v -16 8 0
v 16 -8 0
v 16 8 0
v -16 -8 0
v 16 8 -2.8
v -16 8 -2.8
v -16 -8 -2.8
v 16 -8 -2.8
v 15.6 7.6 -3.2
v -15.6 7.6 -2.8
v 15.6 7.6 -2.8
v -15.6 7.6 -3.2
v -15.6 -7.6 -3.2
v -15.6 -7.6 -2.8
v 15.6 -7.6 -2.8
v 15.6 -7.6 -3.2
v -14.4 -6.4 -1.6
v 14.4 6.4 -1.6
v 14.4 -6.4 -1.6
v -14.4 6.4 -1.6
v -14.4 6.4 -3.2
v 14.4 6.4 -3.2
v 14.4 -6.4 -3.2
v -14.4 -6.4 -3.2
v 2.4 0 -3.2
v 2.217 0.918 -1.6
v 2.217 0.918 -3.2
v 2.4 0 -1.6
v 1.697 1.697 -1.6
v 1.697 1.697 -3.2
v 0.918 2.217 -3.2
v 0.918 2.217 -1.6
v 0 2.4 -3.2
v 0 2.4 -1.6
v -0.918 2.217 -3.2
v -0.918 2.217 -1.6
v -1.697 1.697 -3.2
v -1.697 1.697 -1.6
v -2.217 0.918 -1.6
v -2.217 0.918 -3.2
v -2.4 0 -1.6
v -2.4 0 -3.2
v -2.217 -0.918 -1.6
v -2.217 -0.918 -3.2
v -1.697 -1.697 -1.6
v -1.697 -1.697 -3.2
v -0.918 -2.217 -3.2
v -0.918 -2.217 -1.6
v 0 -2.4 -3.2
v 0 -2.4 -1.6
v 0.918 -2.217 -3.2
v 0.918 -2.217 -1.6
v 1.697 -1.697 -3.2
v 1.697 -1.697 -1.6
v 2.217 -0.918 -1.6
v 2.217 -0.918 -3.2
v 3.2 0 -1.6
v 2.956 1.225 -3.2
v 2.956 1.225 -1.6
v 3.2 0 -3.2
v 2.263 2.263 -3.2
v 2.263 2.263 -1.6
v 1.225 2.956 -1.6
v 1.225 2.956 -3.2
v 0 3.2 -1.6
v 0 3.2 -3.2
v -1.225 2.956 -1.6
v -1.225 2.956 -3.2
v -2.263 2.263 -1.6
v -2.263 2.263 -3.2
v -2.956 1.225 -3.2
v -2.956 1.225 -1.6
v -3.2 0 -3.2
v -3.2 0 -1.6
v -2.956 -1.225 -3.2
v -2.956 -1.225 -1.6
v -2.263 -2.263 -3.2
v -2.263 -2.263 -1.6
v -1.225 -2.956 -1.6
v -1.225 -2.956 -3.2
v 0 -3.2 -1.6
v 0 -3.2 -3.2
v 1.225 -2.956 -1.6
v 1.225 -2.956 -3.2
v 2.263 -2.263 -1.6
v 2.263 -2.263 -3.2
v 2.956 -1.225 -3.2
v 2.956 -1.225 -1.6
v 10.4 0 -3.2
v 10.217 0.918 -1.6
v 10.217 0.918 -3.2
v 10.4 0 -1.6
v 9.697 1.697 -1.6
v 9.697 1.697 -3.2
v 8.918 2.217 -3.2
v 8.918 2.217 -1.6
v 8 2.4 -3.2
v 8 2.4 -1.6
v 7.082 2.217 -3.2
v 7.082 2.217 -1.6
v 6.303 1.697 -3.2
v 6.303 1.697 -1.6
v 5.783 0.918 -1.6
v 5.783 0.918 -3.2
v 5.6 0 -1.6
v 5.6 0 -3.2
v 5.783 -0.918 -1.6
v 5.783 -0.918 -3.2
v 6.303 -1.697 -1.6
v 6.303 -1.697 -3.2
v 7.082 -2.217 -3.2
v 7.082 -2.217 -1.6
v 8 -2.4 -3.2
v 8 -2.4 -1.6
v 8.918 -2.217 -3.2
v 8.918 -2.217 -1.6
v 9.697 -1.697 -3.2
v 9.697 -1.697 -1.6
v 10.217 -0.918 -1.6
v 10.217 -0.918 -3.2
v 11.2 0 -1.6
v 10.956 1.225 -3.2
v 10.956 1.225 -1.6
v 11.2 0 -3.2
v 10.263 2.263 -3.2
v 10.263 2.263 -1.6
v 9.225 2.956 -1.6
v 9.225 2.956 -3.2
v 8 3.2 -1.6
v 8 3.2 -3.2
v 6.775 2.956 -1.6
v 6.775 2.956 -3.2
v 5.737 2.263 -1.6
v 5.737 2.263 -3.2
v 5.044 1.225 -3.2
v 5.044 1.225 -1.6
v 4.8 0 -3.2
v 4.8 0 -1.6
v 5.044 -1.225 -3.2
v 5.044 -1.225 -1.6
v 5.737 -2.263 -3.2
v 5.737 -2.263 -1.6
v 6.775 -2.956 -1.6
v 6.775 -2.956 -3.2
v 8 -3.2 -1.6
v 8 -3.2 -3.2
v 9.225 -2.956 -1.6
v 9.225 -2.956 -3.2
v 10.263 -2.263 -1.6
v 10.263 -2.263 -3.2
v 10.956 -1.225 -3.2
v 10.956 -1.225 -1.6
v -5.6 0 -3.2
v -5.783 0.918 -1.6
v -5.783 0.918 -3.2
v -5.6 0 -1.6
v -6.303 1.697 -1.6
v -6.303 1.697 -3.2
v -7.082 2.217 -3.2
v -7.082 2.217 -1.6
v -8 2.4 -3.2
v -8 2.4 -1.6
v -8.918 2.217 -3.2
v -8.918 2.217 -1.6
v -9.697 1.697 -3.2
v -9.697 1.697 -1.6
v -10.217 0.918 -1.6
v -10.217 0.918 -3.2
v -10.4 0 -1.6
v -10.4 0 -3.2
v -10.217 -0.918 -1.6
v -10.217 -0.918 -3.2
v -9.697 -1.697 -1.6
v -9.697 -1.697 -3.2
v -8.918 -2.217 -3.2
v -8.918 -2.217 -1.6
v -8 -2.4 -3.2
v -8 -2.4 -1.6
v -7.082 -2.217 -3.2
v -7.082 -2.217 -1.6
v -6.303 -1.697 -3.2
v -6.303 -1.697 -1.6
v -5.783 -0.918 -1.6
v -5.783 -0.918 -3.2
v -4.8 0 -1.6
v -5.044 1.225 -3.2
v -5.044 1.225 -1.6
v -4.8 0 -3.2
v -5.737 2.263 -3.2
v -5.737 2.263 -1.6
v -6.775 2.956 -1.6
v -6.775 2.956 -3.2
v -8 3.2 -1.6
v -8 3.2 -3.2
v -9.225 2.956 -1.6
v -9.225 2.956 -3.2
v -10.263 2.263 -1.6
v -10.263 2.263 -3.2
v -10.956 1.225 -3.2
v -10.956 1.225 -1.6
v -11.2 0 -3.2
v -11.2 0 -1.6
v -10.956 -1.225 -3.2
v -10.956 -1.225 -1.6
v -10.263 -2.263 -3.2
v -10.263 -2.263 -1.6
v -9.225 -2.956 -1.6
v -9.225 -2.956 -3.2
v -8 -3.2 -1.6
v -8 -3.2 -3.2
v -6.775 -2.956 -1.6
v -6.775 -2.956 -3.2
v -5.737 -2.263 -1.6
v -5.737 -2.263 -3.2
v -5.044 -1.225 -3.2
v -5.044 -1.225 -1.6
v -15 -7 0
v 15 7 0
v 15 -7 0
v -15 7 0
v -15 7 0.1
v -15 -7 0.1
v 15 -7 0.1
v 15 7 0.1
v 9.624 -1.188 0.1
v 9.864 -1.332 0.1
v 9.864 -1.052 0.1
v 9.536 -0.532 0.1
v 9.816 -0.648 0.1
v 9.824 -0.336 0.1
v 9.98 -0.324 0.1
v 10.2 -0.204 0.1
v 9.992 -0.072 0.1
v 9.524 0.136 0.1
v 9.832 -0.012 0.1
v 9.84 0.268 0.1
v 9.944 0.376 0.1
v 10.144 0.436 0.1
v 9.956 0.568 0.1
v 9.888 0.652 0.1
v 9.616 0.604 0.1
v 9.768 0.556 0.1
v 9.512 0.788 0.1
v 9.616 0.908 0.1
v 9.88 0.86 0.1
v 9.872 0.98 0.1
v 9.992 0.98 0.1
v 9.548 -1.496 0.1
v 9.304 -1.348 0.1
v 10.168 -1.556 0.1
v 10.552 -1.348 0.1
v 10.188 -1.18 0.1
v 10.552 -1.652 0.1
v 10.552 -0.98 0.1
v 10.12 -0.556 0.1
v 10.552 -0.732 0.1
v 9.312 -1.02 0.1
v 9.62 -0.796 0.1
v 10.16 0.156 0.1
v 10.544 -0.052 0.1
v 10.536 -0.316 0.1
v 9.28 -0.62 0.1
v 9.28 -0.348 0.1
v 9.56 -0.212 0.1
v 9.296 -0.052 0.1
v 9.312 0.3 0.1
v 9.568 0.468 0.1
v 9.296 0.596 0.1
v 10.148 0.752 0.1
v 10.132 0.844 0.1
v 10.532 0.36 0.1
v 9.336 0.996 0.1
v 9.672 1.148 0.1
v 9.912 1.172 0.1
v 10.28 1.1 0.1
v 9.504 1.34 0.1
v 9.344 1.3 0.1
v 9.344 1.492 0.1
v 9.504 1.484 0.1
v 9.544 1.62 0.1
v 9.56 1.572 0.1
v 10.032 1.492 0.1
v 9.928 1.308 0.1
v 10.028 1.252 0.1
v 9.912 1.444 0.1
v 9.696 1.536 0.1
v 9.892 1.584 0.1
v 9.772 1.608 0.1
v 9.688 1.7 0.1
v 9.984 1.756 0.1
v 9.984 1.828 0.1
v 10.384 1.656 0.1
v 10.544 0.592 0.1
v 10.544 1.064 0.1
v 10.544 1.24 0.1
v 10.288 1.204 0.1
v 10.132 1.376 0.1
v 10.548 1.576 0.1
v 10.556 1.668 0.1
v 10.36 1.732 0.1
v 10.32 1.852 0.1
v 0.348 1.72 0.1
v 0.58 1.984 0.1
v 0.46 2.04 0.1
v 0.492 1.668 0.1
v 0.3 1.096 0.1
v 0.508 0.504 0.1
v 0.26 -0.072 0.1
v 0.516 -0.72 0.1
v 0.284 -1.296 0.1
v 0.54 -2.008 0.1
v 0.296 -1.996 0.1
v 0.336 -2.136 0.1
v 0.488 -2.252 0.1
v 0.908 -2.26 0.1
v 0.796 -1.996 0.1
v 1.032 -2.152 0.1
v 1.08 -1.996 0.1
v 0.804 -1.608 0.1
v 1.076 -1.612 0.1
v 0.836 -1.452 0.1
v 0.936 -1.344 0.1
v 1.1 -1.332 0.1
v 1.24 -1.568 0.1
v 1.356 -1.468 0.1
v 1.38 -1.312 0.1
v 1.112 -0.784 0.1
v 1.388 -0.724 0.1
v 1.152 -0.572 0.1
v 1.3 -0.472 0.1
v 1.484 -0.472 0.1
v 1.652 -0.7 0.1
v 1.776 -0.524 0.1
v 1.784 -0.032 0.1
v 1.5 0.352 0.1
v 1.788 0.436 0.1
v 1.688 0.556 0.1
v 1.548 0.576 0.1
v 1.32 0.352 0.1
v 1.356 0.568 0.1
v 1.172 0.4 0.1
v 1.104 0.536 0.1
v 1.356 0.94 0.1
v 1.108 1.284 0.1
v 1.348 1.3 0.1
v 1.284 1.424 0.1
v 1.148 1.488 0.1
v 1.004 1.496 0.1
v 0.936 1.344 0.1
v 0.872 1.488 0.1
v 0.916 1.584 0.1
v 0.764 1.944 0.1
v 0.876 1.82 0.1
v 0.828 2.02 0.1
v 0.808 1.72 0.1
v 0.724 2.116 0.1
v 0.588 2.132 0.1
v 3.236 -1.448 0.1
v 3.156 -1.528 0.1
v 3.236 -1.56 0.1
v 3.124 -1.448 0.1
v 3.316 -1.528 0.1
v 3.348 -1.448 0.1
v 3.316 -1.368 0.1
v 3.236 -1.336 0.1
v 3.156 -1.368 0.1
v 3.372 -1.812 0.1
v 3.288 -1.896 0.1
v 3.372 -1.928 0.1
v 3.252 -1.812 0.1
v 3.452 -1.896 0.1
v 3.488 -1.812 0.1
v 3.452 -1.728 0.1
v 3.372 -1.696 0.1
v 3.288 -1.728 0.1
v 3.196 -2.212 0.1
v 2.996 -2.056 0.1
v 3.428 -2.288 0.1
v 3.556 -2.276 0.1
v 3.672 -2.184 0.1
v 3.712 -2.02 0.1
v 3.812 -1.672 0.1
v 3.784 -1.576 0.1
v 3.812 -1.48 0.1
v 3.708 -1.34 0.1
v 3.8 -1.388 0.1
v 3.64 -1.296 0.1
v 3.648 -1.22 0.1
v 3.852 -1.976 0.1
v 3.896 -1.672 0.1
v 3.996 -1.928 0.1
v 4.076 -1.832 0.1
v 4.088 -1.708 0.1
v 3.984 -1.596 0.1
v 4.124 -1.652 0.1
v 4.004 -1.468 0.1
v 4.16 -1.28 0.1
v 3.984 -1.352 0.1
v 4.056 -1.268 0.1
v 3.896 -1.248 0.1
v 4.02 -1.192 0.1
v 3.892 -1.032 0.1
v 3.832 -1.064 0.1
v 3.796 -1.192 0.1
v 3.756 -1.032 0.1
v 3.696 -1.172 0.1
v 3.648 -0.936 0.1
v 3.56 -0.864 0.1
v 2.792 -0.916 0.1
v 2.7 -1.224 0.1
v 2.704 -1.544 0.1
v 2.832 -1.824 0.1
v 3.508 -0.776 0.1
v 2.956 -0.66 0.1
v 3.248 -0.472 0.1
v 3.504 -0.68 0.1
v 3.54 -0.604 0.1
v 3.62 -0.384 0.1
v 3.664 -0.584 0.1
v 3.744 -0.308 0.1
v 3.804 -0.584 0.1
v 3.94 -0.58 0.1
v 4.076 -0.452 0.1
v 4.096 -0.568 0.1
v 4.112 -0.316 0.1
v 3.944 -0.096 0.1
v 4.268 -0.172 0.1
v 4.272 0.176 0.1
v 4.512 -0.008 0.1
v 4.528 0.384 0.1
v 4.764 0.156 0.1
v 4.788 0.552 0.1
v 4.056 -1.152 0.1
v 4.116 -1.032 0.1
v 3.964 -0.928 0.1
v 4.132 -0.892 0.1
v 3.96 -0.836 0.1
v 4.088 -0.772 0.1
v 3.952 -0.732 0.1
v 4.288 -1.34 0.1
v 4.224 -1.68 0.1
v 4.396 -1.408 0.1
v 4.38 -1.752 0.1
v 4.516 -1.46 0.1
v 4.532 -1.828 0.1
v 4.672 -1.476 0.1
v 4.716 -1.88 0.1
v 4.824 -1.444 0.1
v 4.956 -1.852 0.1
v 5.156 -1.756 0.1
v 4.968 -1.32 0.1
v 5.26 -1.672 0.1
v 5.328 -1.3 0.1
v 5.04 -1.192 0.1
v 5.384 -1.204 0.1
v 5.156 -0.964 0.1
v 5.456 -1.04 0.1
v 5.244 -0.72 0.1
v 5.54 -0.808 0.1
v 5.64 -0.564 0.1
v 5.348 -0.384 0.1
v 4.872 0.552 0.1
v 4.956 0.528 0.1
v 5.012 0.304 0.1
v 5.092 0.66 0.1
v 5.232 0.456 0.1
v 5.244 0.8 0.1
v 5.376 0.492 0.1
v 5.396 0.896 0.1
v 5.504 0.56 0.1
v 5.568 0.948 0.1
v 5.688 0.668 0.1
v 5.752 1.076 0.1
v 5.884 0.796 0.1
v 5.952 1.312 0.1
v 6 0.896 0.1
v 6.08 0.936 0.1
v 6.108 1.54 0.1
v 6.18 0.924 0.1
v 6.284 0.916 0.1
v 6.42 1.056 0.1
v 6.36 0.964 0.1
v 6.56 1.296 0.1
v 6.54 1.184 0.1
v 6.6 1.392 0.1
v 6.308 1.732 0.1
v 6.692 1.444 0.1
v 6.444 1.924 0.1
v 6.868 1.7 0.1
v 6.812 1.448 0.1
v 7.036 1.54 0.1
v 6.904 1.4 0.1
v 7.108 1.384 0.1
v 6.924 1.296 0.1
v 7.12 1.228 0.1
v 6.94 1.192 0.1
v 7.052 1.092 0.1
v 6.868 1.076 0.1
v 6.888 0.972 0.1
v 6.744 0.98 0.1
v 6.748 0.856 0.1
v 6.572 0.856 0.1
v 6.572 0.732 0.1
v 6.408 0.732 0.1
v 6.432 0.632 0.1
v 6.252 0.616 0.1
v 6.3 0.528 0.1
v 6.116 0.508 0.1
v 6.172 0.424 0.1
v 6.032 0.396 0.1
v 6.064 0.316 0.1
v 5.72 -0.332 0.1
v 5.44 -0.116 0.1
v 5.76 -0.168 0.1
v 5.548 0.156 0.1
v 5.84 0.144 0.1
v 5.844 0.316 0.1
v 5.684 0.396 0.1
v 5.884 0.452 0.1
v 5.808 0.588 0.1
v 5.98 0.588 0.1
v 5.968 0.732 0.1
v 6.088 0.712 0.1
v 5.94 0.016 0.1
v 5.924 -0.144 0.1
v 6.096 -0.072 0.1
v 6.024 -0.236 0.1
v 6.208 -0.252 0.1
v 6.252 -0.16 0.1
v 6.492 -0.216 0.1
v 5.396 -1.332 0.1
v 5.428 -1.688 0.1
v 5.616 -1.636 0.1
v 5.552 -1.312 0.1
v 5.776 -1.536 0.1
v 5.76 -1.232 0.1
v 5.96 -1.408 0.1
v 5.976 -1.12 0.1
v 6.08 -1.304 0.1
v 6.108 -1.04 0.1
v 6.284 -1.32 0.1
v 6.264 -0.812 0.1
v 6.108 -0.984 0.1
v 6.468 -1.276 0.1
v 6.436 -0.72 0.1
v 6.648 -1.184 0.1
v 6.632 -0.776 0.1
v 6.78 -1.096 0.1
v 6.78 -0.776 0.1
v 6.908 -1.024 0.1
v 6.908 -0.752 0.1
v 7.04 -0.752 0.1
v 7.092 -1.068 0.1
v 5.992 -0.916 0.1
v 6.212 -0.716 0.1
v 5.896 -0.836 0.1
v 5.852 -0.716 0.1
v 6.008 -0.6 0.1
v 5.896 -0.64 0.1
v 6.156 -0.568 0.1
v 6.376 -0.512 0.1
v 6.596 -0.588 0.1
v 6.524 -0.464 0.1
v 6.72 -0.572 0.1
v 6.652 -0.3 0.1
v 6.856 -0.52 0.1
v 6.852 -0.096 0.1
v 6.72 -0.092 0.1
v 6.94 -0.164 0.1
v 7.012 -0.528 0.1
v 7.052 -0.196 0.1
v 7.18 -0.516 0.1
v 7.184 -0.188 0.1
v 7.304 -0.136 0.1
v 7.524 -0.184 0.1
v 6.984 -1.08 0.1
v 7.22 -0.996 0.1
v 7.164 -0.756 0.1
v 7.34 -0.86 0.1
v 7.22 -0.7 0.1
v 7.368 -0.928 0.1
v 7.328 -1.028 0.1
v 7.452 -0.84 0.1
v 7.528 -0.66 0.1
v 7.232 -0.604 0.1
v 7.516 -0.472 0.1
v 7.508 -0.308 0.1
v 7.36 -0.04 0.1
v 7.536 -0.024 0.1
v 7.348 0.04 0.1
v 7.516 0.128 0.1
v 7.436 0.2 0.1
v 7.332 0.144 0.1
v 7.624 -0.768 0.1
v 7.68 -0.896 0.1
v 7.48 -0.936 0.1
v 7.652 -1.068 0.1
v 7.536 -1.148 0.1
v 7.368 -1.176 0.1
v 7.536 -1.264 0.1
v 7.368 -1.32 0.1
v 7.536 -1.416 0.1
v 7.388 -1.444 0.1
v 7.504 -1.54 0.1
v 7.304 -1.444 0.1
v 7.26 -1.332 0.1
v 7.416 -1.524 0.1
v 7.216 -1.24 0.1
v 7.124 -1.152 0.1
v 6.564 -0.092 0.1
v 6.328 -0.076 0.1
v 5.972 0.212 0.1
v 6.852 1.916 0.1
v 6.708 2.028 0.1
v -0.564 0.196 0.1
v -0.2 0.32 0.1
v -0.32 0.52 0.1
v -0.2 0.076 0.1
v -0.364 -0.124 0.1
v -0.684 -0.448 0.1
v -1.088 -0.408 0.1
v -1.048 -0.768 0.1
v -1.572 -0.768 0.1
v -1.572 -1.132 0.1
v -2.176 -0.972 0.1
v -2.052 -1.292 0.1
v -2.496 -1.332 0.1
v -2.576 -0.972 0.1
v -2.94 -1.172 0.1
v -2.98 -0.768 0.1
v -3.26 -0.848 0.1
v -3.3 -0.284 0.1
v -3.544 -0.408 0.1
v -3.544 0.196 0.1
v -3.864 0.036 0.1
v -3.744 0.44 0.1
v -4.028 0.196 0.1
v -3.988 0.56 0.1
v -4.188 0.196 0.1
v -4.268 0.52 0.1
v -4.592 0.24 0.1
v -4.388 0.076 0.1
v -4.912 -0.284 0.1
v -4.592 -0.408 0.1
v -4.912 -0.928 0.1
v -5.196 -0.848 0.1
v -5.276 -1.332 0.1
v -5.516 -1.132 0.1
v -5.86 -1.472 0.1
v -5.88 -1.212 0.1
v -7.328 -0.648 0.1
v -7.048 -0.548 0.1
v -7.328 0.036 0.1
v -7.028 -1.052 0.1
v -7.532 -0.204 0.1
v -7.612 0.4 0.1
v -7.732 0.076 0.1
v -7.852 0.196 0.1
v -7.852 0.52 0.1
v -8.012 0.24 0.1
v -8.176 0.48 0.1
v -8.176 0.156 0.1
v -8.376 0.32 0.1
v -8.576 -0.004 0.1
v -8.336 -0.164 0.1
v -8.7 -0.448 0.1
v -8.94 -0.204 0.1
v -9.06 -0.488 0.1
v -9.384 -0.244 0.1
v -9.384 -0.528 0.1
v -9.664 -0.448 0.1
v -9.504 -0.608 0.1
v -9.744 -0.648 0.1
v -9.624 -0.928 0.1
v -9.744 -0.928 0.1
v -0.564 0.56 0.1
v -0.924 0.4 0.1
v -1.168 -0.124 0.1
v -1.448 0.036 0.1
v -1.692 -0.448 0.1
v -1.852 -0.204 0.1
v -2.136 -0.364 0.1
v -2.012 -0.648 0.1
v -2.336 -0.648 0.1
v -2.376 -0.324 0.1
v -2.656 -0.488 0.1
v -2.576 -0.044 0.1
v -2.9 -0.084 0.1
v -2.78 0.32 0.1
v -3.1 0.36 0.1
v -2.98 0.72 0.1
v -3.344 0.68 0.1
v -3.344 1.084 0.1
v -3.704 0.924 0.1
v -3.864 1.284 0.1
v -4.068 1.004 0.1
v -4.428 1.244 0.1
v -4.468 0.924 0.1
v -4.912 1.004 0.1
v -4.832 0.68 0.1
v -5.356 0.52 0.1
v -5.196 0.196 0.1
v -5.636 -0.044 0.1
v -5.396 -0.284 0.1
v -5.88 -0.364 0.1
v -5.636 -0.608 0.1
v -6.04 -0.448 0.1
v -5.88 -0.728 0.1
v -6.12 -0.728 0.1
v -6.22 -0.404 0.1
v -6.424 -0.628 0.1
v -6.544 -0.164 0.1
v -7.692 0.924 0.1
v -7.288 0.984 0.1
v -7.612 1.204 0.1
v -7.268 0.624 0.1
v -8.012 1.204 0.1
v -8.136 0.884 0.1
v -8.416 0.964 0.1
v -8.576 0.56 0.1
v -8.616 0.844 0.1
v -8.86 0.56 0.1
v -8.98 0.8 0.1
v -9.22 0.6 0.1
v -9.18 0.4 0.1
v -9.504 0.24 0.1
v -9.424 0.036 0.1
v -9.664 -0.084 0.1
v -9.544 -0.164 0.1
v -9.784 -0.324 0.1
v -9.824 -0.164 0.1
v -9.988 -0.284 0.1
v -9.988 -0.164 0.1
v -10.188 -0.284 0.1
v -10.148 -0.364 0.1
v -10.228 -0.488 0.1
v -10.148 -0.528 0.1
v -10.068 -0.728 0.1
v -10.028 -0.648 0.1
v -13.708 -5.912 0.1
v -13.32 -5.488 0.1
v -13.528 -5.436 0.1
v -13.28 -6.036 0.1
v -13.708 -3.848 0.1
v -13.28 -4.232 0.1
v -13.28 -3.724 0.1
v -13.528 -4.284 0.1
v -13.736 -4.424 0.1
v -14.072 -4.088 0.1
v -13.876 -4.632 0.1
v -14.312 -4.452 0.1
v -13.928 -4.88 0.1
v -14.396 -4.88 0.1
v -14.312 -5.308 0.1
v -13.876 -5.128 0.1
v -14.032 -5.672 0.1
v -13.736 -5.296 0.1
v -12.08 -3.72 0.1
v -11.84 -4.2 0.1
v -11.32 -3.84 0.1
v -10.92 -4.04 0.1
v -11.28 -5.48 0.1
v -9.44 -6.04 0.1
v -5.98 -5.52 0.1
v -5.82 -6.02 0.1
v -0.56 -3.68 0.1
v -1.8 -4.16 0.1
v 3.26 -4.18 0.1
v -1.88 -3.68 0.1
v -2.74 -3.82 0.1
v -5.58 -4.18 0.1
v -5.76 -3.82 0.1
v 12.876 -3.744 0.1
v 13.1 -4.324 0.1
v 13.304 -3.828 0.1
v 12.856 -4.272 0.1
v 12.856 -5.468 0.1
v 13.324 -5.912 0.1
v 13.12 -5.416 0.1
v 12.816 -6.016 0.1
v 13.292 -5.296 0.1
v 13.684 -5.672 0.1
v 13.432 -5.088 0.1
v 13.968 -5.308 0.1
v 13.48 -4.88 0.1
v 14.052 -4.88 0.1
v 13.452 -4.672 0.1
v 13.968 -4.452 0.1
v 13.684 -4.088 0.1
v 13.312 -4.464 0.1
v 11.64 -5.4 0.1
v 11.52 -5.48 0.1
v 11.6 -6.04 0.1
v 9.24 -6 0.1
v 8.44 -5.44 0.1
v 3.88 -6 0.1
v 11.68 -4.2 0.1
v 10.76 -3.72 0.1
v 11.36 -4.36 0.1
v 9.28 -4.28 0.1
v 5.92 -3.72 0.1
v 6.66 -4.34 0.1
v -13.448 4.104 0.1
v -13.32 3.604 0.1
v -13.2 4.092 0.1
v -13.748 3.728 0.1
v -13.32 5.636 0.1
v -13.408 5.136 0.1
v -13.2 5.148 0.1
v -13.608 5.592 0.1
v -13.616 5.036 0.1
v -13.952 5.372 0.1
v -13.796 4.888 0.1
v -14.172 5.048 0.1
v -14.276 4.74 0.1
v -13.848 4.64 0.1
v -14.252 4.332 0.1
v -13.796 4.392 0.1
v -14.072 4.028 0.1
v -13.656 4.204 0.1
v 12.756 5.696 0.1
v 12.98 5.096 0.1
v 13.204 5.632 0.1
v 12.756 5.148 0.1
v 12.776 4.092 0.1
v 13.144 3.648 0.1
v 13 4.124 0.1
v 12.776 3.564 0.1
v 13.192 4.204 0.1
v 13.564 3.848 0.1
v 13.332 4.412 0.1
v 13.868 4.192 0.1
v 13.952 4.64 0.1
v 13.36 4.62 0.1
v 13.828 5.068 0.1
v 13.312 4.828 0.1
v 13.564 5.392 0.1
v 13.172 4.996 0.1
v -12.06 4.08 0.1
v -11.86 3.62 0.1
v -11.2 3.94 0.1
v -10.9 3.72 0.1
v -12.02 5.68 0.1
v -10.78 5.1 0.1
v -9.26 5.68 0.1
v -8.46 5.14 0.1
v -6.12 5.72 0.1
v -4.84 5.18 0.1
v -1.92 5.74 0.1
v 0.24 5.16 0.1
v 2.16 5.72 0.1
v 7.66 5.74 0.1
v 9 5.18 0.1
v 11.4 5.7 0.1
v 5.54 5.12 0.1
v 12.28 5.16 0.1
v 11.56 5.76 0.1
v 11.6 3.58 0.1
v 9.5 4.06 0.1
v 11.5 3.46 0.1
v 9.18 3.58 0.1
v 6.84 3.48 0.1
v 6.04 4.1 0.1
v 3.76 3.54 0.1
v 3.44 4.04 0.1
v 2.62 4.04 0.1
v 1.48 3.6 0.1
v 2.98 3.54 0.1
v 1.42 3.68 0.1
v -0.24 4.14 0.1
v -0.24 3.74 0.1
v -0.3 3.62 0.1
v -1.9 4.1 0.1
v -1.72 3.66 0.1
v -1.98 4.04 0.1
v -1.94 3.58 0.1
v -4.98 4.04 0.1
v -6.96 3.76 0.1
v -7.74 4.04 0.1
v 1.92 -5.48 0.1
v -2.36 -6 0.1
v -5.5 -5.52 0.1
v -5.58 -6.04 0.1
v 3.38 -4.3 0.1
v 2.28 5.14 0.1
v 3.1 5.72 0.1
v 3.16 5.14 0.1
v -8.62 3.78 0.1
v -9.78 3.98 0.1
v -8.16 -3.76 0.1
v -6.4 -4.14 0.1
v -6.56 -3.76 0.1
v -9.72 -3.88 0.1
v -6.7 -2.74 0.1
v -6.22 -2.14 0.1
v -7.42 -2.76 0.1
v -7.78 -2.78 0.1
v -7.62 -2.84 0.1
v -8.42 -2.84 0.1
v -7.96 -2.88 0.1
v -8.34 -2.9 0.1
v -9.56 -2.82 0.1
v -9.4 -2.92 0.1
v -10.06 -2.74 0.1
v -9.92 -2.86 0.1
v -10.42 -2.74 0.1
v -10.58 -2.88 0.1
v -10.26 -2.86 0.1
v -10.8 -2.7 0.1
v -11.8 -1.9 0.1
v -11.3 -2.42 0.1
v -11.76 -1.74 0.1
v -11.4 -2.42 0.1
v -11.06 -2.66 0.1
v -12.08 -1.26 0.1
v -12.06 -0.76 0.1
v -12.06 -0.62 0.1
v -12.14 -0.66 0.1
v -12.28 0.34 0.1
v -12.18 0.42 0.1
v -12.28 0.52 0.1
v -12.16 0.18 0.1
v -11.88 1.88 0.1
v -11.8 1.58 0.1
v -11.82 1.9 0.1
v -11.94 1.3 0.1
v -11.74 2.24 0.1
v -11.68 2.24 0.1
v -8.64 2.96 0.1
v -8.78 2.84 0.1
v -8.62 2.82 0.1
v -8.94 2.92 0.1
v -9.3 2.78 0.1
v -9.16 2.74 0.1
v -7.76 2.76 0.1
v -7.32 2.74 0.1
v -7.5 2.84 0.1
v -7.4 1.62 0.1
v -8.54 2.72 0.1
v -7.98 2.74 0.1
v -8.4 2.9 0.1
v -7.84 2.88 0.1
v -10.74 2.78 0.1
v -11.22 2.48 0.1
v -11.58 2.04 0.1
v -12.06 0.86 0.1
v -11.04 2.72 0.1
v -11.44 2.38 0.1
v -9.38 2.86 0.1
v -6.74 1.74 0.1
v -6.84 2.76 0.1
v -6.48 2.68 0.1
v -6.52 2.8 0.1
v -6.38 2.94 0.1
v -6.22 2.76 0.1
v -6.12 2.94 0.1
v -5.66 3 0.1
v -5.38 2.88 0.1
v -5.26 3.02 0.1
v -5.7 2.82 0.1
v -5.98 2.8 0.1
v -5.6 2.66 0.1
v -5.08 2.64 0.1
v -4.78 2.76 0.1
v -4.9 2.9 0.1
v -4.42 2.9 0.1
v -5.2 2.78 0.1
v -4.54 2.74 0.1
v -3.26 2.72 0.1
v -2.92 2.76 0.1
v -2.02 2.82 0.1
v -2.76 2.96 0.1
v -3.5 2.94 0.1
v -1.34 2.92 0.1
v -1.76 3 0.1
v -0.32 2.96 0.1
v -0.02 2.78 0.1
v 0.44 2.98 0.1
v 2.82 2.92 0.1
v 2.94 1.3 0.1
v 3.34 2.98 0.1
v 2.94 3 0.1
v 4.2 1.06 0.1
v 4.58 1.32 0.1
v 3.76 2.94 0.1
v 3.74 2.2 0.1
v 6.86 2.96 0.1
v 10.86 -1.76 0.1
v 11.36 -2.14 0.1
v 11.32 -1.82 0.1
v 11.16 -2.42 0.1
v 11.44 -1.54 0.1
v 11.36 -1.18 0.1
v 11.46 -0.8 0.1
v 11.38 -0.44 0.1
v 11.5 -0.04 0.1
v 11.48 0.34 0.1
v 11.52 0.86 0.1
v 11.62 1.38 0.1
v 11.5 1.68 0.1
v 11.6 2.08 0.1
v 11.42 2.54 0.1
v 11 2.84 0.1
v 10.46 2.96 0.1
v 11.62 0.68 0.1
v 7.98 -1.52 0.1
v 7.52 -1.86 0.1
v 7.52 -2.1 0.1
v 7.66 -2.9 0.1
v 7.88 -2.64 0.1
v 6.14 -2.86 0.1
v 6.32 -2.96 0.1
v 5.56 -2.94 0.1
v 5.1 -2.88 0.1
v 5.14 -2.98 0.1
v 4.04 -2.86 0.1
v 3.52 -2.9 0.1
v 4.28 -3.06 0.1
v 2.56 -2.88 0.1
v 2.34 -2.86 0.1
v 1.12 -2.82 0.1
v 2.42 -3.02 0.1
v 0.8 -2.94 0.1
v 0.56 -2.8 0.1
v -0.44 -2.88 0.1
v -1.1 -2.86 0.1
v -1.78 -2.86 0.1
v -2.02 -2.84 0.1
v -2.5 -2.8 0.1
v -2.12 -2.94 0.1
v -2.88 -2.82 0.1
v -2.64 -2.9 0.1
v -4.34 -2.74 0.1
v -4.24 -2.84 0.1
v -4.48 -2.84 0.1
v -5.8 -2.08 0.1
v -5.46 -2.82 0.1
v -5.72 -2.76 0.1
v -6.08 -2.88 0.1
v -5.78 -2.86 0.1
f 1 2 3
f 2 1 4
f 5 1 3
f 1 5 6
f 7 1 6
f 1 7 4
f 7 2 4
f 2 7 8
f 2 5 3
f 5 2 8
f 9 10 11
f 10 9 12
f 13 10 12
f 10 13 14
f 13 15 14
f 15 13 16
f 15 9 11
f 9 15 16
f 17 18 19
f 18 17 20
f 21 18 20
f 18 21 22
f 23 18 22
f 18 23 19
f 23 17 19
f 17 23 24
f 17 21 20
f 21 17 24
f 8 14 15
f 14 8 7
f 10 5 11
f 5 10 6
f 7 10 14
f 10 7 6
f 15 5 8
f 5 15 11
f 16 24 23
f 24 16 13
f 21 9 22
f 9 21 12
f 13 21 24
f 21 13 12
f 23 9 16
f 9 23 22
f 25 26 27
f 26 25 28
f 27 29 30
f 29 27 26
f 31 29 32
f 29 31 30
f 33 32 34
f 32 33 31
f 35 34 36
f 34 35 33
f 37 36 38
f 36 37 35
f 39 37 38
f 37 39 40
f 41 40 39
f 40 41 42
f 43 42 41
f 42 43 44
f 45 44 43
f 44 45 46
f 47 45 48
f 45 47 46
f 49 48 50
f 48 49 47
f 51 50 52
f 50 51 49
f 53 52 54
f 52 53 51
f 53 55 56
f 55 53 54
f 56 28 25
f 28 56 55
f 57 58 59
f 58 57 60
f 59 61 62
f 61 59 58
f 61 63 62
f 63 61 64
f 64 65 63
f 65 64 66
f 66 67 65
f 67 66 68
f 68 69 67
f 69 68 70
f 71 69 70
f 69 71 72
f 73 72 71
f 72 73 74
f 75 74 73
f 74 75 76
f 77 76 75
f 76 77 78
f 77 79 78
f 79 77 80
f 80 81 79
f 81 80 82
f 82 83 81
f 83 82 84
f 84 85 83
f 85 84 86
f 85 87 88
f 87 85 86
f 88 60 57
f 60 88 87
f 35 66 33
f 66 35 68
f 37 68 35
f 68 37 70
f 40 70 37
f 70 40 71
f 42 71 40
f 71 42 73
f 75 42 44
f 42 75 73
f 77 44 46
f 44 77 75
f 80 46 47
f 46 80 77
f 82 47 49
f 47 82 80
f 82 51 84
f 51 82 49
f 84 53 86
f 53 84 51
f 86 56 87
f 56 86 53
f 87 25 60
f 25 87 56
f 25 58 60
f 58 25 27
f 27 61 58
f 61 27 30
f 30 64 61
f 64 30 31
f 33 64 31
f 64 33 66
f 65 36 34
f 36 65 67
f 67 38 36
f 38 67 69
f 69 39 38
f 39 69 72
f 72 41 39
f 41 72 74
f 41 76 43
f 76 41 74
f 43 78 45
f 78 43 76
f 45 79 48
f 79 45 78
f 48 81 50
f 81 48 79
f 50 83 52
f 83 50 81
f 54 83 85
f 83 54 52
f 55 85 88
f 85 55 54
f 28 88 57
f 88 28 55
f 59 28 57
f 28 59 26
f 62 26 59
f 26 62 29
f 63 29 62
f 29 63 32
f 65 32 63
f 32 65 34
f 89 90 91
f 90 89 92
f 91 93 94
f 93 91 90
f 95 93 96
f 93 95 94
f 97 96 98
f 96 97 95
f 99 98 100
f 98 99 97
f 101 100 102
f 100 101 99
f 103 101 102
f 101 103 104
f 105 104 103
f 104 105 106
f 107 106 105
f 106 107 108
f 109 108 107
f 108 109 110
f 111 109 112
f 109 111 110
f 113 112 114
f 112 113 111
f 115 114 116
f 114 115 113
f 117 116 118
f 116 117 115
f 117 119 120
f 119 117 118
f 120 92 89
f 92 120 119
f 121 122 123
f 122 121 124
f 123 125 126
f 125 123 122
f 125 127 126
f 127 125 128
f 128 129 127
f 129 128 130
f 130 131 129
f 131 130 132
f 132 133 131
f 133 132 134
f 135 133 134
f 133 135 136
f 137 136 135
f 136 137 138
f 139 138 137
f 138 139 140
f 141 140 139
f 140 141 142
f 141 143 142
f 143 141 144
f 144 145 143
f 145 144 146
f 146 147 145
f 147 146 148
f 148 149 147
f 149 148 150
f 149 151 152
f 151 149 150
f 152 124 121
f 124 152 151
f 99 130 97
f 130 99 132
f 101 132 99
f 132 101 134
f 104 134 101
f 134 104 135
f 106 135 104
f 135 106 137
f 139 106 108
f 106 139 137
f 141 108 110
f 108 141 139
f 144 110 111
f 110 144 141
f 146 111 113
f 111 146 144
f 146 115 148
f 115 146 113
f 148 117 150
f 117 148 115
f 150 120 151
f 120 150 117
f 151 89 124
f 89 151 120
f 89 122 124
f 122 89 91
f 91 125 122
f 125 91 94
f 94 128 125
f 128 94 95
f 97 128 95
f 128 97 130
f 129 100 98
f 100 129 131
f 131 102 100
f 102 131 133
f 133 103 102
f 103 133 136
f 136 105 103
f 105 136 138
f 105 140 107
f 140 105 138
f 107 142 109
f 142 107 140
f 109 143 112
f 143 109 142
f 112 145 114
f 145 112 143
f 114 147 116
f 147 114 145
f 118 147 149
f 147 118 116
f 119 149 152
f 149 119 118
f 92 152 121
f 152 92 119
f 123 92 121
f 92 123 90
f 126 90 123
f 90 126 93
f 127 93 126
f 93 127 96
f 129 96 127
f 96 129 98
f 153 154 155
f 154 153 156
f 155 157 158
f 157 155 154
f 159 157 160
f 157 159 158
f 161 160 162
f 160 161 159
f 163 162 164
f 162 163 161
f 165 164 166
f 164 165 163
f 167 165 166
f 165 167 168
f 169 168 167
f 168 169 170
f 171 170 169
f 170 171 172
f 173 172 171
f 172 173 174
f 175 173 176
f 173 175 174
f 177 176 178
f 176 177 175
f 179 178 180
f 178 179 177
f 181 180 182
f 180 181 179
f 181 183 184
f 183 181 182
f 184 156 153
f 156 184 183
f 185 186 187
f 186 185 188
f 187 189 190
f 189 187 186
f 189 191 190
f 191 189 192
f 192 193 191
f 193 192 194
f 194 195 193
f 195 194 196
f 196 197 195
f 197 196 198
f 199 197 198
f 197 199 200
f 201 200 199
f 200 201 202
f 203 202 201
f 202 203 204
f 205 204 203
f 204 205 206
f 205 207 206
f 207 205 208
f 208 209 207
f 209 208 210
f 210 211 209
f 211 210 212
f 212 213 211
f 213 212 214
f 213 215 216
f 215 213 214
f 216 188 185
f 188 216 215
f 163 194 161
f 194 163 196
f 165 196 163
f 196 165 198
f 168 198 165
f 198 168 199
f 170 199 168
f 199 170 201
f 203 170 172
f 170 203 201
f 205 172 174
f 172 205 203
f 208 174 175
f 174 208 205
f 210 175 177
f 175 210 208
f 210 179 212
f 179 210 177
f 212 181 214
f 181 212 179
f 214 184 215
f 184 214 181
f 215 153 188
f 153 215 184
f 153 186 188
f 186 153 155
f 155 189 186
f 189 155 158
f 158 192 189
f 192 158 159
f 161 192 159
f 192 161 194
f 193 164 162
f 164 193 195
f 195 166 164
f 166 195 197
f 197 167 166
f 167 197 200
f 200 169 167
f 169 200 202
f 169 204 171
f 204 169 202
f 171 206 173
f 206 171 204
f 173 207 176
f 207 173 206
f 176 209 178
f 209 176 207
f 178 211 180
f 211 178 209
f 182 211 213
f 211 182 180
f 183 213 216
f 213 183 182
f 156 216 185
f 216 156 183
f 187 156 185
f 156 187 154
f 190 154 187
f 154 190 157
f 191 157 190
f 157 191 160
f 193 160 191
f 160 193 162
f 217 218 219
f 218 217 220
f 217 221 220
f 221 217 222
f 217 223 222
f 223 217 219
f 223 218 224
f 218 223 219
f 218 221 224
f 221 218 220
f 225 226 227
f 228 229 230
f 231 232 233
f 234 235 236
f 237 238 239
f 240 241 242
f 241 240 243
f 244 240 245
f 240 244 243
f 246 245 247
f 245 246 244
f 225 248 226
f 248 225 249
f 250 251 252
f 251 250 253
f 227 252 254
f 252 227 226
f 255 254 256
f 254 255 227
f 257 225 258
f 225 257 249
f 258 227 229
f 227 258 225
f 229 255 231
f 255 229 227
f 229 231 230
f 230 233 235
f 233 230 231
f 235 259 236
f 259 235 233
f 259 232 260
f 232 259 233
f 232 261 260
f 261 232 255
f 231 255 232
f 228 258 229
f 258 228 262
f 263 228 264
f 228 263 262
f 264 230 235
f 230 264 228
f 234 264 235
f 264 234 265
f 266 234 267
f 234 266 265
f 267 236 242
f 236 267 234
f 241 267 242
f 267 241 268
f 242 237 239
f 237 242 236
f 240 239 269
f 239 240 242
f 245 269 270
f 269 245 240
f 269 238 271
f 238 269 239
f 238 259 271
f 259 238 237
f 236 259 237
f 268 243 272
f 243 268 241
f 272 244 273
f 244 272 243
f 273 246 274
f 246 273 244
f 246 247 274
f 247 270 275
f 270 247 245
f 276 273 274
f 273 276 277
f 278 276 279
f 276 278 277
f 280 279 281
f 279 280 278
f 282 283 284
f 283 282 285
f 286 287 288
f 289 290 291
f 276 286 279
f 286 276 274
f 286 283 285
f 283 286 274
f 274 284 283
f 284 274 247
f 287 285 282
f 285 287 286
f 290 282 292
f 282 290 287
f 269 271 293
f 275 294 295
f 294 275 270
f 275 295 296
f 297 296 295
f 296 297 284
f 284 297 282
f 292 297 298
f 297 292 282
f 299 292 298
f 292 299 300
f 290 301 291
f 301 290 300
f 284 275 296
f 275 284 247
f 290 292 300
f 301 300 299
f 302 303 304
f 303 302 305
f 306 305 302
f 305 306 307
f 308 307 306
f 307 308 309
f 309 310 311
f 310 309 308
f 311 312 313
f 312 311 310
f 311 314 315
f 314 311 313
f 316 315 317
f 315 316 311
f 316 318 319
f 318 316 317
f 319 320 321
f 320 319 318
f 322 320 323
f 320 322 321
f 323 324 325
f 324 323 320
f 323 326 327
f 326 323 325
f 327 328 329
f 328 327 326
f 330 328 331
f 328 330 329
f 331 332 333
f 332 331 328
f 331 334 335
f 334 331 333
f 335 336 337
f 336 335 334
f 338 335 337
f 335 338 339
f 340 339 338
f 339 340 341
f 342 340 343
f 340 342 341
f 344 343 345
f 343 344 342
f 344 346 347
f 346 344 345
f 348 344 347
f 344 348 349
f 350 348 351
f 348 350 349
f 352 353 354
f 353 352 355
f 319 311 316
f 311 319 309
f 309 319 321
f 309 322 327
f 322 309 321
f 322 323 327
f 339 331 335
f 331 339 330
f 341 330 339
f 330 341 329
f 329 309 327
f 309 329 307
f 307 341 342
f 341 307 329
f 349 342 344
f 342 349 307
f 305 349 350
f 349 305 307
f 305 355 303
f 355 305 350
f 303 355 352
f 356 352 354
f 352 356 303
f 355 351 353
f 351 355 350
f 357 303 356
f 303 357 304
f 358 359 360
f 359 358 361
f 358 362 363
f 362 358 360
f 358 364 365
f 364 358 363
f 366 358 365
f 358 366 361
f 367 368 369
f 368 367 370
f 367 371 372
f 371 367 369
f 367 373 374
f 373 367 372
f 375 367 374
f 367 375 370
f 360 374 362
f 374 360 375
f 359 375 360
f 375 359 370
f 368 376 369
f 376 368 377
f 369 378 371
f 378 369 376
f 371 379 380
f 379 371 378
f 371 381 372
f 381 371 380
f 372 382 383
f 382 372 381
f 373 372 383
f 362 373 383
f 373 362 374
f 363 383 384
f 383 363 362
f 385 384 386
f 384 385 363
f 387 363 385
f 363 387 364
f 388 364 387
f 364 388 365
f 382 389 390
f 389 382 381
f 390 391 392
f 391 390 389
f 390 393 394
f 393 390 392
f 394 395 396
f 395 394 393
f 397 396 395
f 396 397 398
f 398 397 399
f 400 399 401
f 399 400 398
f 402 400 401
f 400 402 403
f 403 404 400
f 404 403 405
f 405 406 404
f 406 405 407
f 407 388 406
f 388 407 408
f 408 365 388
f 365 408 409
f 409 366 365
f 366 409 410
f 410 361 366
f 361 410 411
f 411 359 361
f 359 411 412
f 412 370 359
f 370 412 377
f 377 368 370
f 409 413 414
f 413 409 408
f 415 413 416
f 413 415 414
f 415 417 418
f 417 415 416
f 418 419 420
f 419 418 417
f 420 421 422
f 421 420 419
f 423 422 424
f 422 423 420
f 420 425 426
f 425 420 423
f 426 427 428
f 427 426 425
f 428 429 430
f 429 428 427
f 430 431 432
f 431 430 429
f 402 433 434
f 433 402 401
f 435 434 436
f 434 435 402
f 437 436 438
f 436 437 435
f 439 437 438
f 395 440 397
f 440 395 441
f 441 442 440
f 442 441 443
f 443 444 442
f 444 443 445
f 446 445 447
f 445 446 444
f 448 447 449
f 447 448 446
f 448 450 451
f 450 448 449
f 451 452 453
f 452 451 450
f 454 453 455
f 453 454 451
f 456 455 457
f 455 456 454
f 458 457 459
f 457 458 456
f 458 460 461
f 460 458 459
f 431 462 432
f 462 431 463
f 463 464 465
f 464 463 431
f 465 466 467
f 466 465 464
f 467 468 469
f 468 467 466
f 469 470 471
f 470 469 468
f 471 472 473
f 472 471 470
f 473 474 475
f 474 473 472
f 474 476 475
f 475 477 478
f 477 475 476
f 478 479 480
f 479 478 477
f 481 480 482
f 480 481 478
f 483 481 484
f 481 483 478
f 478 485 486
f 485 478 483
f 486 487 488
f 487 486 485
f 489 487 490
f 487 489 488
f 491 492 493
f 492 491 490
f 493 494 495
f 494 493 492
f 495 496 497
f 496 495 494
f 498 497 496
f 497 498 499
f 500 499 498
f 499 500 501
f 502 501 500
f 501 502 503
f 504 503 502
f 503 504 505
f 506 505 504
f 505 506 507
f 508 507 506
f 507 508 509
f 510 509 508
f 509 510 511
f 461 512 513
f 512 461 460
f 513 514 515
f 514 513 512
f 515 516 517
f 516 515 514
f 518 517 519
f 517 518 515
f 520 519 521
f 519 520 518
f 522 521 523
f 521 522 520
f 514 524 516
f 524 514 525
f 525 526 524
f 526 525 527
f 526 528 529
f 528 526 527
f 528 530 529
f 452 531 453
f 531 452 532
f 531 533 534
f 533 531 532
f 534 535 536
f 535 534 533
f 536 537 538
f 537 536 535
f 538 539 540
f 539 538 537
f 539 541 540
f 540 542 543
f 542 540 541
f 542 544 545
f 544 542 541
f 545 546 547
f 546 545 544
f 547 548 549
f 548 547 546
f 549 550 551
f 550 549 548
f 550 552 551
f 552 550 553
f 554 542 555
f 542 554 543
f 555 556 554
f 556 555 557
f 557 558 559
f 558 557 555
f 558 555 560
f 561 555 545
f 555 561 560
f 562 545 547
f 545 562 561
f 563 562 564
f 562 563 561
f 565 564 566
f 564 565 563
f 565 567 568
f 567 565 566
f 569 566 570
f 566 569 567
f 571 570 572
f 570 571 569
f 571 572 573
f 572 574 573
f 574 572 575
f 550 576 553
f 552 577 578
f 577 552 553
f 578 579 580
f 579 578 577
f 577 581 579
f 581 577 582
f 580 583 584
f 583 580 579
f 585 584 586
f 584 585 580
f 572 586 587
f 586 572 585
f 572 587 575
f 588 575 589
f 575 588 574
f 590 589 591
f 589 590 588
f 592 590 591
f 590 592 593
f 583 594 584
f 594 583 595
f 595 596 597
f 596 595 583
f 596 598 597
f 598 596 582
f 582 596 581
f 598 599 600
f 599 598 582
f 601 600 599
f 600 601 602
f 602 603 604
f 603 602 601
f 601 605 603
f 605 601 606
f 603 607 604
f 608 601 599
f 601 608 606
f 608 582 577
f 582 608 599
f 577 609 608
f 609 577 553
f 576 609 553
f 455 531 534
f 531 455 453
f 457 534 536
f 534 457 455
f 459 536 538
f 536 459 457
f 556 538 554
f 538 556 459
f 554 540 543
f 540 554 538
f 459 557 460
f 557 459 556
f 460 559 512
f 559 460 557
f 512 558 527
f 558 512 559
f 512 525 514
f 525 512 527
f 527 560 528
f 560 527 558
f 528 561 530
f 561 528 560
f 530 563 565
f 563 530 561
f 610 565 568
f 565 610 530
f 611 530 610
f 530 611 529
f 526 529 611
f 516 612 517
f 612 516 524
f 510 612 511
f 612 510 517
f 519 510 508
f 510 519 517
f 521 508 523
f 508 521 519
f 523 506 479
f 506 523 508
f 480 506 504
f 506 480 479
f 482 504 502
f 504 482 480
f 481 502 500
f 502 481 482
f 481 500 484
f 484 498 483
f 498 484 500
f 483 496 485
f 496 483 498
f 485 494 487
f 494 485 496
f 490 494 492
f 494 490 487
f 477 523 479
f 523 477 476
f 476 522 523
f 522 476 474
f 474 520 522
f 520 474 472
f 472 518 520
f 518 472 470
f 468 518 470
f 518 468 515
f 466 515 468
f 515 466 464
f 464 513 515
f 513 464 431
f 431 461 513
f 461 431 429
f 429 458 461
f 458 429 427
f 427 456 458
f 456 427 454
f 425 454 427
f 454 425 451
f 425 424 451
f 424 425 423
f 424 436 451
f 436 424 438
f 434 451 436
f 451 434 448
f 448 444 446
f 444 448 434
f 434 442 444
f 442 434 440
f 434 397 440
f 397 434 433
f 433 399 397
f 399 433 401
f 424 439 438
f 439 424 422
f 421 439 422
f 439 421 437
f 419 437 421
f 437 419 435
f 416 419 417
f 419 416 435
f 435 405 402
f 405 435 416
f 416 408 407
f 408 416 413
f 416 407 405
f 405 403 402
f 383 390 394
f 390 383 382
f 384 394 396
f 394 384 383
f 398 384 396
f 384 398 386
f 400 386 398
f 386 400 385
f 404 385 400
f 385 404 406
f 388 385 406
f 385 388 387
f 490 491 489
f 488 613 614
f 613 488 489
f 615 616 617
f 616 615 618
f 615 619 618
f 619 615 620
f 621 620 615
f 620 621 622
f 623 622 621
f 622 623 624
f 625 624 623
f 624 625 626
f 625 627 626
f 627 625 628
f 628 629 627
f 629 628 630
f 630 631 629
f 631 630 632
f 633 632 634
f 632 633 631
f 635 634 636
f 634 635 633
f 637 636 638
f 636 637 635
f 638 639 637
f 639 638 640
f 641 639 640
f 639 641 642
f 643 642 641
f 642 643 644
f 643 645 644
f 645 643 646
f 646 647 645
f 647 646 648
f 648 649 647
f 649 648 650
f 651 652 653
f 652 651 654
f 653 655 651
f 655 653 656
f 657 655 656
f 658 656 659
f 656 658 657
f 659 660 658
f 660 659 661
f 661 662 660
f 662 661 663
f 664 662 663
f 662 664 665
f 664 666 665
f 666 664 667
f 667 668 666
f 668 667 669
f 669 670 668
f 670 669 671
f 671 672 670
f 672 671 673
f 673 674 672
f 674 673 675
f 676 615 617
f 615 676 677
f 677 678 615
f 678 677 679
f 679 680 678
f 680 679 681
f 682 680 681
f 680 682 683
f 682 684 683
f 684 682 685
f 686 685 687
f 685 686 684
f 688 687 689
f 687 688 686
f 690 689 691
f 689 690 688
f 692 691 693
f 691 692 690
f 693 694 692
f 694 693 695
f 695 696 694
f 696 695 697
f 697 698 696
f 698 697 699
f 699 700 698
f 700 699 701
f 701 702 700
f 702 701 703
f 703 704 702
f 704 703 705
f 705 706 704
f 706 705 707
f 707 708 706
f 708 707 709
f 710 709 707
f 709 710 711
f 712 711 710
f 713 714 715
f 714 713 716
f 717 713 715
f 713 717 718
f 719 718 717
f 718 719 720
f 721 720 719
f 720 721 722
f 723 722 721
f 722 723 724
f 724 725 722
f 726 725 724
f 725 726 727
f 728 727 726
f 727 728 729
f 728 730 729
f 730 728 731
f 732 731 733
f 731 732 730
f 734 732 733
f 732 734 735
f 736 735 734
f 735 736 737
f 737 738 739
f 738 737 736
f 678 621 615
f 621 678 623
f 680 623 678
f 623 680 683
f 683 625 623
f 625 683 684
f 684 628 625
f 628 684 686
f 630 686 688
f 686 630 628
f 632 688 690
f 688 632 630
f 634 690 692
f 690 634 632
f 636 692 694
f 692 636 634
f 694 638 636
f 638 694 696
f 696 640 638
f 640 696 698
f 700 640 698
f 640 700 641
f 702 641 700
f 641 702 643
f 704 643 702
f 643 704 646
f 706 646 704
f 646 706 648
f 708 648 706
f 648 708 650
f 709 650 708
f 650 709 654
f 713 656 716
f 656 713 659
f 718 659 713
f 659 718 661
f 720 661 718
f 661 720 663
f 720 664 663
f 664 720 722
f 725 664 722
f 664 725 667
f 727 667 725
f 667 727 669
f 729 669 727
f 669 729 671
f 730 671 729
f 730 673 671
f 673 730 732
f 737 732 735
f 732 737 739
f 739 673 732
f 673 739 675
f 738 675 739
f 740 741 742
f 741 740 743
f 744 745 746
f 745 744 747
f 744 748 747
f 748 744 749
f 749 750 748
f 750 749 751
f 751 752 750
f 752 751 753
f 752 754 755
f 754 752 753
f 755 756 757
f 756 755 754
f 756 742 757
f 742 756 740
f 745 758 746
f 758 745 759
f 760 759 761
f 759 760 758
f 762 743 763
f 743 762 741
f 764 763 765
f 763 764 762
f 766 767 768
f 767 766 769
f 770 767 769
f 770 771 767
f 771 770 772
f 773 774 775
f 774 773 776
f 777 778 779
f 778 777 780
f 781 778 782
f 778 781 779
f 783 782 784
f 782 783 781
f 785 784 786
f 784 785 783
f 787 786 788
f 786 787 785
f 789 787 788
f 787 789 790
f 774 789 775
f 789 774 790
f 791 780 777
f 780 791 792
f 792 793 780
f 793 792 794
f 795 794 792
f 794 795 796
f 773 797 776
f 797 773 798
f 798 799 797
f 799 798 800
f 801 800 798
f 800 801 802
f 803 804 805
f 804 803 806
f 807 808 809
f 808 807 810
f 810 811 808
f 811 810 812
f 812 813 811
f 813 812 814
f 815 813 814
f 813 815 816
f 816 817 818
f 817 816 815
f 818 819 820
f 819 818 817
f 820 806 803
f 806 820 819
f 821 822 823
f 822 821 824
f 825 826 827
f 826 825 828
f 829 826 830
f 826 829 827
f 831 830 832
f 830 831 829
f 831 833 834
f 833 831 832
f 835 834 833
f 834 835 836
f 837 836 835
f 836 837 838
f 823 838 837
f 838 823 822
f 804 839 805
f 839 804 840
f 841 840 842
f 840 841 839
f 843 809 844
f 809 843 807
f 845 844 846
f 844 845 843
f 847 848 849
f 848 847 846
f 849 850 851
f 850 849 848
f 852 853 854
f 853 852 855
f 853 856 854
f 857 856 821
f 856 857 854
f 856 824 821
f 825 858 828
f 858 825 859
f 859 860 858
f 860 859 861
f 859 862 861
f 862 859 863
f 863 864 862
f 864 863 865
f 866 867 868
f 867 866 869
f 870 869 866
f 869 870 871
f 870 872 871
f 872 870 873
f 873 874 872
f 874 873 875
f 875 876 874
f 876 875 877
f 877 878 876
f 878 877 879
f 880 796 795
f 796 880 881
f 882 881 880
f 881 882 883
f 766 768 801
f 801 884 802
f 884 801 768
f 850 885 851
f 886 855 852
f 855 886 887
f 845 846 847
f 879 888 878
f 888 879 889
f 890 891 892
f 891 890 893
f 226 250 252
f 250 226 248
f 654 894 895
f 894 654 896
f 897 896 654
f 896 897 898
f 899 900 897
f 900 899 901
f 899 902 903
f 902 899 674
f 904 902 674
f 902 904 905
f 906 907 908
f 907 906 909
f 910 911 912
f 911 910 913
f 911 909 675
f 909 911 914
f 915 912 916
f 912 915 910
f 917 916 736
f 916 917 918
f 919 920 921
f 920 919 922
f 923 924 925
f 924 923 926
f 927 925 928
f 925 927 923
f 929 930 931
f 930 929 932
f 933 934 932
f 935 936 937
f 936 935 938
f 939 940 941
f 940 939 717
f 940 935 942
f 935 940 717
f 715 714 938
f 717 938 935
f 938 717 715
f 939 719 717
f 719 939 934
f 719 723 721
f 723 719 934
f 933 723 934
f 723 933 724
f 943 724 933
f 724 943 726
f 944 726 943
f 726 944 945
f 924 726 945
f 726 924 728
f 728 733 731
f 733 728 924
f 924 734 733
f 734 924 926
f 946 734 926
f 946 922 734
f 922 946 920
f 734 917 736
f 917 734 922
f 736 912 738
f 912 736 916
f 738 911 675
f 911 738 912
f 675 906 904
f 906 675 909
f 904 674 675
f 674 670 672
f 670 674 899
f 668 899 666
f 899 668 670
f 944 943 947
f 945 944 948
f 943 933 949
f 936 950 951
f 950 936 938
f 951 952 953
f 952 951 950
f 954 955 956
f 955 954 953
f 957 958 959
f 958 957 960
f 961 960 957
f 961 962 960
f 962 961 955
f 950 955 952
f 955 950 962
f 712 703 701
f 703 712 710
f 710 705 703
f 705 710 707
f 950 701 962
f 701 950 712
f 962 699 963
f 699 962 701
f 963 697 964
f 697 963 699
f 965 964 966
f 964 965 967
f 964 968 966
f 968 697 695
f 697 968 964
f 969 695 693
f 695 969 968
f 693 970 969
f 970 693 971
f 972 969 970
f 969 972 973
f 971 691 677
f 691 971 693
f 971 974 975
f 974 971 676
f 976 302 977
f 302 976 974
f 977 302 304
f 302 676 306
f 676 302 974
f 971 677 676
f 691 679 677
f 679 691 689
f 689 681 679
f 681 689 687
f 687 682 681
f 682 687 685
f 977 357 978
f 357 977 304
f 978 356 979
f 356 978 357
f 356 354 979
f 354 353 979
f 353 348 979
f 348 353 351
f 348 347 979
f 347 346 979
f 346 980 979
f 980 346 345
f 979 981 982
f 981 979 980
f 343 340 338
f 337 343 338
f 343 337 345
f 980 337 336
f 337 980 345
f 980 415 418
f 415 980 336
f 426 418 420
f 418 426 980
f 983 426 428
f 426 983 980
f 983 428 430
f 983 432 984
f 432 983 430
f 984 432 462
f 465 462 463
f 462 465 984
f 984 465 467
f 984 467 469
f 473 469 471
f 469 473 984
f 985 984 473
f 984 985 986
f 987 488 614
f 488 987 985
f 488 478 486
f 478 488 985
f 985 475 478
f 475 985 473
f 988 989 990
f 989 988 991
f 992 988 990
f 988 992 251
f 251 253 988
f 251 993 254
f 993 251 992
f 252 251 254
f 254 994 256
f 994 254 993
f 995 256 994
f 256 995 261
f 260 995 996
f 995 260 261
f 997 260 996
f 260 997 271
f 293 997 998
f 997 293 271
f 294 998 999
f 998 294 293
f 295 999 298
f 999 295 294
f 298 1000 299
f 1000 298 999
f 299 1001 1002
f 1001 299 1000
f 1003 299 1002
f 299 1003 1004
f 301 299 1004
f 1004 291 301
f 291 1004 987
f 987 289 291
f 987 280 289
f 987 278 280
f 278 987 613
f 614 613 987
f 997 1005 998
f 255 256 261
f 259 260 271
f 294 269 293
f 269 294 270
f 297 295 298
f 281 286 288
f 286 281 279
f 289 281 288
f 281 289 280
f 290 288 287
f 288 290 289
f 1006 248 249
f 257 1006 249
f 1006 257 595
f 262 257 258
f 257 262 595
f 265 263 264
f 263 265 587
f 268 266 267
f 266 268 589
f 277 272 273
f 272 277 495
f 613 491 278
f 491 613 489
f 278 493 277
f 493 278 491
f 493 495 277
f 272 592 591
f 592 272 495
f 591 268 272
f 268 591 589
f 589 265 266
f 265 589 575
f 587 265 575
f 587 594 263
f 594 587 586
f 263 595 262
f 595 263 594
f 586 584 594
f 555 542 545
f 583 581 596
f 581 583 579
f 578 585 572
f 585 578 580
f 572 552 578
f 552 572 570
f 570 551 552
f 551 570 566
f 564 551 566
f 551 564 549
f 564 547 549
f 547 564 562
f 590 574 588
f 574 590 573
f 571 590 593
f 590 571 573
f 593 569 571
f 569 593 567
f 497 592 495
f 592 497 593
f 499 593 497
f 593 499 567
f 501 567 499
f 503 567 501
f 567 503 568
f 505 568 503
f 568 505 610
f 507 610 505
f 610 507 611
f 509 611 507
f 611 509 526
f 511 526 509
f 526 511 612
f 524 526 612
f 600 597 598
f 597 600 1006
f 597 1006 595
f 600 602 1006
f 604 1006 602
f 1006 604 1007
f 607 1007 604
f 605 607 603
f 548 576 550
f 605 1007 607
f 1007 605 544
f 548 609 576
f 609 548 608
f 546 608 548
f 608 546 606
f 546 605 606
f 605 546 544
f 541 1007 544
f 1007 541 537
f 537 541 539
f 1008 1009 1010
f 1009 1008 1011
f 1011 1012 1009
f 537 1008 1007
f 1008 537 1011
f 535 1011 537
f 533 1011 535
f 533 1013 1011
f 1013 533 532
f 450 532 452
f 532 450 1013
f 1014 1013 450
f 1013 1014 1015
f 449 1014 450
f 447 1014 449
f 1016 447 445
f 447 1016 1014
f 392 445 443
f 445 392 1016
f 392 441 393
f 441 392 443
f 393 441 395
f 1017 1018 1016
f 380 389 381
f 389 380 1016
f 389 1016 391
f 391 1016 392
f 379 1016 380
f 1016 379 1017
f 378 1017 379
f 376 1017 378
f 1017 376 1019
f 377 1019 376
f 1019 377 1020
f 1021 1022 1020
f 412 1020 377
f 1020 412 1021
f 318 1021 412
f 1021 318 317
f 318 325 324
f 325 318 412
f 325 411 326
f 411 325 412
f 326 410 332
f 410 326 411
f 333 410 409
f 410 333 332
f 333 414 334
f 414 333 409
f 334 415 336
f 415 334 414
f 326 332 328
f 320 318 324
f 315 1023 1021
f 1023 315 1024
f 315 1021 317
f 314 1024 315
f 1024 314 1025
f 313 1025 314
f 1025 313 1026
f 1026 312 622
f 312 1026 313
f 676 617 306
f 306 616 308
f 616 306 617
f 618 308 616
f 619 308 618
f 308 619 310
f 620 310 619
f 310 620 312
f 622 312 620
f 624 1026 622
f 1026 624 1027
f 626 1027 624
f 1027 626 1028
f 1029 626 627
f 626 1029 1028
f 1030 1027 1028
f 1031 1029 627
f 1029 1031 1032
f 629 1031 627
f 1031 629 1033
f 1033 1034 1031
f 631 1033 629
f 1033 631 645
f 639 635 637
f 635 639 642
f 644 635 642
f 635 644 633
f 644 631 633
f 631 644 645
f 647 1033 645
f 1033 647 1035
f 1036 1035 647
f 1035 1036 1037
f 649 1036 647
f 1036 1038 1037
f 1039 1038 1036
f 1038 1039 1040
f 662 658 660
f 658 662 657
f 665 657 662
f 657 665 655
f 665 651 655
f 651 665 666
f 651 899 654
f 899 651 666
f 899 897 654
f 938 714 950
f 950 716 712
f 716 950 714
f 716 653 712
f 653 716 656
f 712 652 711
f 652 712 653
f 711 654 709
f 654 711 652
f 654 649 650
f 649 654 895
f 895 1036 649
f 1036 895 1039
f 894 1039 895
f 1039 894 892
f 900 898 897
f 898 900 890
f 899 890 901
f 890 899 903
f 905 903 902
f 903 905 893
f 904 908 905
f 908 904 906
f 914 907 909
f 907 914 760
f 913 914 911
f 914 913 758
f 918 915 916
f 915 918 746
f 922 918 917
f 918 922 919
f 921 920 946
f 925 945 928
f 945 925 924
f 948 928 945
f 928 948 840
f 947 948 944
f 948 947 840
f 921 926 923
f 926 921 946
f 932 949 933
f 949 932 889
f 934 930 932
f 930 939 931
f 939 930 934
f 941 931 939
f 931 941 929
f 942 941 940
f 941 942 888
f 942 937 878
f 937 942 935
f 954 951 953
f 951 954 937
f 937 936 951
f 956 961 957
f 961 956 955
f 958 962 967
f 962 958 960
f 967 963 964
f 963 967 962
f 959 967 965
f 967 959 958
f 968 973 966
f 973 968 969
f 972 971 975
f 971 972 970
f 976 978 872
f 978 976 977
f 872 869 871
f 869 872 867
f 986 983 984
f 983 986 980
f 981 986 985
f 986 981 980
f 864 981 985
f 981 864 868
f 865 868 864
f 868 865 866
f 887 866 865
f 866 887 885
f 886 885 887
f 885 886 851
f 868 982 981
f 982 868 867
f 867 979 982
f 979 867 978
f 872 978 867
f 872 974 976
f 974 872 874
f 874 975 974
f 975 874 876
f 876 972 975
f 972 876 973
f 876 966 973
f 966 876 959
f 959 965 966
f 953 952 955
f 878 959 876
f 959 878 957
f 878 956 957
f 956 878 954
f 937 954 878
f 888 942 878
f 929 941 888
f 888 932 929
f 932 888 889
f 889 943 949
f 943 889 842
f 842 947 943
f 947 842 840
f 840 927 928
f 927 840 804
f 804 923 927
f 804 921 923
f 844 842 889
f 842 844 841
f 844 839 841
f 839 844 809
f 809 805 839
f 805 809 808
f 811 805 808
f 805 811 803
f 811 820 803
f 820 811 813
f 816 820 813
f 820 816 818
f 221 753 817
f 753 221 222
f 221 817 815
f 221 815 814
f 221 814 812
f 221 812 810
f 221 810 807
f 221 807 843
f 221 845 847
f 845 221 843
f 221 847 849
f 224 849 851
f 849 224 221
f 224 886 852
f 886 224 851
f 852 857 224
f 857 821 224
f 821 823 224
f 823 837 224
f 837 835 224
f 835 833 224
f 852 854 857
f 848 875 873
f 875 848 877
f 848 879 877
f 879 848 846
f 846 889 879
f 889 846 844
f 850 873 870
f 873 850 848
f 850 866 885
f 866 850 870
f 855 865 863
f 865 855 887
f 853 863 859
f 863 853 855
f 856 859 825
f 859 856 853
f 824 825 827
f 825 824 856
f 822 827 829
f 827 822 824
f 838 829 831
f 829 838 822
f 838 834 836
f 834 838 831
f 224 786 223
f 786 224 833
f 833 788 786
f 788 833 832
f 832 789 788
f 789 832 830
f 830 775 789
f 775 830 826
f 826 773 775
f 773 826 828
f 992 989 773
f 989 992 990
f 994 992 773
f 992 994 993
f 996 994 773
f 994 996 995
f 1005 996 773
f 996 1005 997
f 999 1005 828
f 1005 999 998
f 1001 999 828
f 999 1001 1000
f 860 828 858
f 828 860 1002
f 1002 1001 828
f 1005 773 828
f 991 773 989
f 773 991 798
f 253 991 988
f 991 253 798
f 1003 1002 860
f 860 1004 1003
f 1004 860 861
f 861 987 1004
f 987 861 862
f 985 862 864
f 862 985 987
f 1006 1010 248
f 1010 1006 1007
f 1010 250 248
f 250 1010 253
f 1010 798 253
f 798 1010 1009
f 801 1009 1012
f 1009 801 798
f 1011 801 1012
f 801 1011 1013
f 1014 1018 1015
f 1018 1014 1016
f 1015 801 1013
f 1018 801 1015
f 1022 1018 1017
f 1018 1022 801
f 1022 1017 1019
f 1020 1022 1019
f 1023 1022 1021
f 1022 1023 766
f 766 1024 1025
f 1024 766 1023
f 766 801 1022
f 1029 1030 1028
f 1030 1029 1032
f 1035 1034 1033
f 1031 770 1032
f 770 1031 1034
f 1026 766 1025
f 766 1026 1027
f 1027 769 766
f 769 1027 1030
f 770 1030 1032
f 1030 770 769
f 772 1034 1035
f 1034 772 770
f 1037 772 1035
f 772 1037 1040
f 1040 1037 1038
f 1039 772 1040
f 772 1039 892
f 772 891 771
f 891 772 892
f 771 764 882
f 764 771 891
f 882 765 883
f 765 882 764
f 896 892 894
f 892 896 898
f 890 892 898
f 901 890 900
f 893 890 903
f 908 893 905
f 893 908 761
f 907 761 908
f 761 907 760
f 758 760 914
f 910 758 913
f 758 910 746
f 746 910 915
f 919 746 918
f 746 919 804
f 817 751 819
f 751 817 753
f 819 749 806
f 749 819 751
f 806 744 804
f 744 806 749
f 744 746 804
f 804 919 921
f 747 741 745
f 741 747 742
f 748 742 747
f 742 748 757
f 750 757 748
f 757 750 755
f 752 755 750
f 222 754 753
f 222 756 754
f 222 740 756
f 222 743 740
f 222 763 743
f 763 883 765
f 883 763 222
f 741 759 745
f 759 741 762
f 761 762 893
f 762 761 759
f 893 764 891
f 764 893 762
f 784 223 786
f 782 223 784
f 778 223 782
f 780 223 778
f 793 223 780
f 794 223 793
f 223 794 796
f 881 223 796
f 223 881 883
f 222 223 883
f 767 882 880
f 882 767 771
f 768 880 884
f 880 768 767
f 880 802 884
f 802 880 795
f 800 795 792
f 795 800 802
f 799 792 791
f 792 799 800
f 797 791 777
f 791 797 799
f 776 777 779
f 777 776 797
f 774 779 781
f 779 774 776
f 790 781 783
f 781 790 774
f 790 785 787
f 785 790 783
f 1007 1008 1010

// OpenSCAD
use <../lib.scad>
use <4613906c.scad>
use <87079.scad>
function ldraw_lib__87079dq2() = [
// 0 Tile  2 x  4 with Hieroglyphs (Snake on Top) Sticker
// 0 Name: 87079dq2.dat
// 0 Author: Christian Neumann [Wesley]
// 0 !LDRAW_ORG Shortcut UPDATE 2024-04
// 0 !LICENSE Licensed under CC BY 4.0 : see CAreadme.txt
// 
// 0 BFC CERTIFY CCW
  [0,"BFC","CERTIFY"],
  [0,"BFC","CCW"],
// 
// 0 !CATEGORY Sticker Shortcut
// 0 !KEYWORDS Pharaoh's Quest, Set 7326
// 
// 0 !CMDLINE -c19
// 
// 0 !HISTORY 2016-12-31 [PTadmin] Official Update 2016-01
// 0 !HISTORY 2024-05-27 [OrionP] Change category to Sticker Shortcut
// 0 !HISTORY 2024-05-28 [OrionP] Official Update 2024-04
// 
// 
// 1 16 0 0 0 1 0 0 0 1 0 0 0 1 87079.dat
  [1,16,0,0,0,1,0,0,0,1,0,0,0,1, ldraw_lib__87079()],
// 1 16 0 0 0 0 0 -1 0 1 0 1 0 0 4613906c.dat
  [1,16,0,0,0,0,0,-1,0,1,0,1,0,0, ldraw_lib__4613906c()],
];
module ldraw_lib__87079dq2(step=0, col=false, unit=2/5, alt=false, line=0.2, solid=!$preview)
    makepoly(ldraw_lib__87079dq2(), step=step, col=col, unit=unit, alt=alt, line=line, solid=solid);
ldraw_lib__87079dq2(line=0.2);
